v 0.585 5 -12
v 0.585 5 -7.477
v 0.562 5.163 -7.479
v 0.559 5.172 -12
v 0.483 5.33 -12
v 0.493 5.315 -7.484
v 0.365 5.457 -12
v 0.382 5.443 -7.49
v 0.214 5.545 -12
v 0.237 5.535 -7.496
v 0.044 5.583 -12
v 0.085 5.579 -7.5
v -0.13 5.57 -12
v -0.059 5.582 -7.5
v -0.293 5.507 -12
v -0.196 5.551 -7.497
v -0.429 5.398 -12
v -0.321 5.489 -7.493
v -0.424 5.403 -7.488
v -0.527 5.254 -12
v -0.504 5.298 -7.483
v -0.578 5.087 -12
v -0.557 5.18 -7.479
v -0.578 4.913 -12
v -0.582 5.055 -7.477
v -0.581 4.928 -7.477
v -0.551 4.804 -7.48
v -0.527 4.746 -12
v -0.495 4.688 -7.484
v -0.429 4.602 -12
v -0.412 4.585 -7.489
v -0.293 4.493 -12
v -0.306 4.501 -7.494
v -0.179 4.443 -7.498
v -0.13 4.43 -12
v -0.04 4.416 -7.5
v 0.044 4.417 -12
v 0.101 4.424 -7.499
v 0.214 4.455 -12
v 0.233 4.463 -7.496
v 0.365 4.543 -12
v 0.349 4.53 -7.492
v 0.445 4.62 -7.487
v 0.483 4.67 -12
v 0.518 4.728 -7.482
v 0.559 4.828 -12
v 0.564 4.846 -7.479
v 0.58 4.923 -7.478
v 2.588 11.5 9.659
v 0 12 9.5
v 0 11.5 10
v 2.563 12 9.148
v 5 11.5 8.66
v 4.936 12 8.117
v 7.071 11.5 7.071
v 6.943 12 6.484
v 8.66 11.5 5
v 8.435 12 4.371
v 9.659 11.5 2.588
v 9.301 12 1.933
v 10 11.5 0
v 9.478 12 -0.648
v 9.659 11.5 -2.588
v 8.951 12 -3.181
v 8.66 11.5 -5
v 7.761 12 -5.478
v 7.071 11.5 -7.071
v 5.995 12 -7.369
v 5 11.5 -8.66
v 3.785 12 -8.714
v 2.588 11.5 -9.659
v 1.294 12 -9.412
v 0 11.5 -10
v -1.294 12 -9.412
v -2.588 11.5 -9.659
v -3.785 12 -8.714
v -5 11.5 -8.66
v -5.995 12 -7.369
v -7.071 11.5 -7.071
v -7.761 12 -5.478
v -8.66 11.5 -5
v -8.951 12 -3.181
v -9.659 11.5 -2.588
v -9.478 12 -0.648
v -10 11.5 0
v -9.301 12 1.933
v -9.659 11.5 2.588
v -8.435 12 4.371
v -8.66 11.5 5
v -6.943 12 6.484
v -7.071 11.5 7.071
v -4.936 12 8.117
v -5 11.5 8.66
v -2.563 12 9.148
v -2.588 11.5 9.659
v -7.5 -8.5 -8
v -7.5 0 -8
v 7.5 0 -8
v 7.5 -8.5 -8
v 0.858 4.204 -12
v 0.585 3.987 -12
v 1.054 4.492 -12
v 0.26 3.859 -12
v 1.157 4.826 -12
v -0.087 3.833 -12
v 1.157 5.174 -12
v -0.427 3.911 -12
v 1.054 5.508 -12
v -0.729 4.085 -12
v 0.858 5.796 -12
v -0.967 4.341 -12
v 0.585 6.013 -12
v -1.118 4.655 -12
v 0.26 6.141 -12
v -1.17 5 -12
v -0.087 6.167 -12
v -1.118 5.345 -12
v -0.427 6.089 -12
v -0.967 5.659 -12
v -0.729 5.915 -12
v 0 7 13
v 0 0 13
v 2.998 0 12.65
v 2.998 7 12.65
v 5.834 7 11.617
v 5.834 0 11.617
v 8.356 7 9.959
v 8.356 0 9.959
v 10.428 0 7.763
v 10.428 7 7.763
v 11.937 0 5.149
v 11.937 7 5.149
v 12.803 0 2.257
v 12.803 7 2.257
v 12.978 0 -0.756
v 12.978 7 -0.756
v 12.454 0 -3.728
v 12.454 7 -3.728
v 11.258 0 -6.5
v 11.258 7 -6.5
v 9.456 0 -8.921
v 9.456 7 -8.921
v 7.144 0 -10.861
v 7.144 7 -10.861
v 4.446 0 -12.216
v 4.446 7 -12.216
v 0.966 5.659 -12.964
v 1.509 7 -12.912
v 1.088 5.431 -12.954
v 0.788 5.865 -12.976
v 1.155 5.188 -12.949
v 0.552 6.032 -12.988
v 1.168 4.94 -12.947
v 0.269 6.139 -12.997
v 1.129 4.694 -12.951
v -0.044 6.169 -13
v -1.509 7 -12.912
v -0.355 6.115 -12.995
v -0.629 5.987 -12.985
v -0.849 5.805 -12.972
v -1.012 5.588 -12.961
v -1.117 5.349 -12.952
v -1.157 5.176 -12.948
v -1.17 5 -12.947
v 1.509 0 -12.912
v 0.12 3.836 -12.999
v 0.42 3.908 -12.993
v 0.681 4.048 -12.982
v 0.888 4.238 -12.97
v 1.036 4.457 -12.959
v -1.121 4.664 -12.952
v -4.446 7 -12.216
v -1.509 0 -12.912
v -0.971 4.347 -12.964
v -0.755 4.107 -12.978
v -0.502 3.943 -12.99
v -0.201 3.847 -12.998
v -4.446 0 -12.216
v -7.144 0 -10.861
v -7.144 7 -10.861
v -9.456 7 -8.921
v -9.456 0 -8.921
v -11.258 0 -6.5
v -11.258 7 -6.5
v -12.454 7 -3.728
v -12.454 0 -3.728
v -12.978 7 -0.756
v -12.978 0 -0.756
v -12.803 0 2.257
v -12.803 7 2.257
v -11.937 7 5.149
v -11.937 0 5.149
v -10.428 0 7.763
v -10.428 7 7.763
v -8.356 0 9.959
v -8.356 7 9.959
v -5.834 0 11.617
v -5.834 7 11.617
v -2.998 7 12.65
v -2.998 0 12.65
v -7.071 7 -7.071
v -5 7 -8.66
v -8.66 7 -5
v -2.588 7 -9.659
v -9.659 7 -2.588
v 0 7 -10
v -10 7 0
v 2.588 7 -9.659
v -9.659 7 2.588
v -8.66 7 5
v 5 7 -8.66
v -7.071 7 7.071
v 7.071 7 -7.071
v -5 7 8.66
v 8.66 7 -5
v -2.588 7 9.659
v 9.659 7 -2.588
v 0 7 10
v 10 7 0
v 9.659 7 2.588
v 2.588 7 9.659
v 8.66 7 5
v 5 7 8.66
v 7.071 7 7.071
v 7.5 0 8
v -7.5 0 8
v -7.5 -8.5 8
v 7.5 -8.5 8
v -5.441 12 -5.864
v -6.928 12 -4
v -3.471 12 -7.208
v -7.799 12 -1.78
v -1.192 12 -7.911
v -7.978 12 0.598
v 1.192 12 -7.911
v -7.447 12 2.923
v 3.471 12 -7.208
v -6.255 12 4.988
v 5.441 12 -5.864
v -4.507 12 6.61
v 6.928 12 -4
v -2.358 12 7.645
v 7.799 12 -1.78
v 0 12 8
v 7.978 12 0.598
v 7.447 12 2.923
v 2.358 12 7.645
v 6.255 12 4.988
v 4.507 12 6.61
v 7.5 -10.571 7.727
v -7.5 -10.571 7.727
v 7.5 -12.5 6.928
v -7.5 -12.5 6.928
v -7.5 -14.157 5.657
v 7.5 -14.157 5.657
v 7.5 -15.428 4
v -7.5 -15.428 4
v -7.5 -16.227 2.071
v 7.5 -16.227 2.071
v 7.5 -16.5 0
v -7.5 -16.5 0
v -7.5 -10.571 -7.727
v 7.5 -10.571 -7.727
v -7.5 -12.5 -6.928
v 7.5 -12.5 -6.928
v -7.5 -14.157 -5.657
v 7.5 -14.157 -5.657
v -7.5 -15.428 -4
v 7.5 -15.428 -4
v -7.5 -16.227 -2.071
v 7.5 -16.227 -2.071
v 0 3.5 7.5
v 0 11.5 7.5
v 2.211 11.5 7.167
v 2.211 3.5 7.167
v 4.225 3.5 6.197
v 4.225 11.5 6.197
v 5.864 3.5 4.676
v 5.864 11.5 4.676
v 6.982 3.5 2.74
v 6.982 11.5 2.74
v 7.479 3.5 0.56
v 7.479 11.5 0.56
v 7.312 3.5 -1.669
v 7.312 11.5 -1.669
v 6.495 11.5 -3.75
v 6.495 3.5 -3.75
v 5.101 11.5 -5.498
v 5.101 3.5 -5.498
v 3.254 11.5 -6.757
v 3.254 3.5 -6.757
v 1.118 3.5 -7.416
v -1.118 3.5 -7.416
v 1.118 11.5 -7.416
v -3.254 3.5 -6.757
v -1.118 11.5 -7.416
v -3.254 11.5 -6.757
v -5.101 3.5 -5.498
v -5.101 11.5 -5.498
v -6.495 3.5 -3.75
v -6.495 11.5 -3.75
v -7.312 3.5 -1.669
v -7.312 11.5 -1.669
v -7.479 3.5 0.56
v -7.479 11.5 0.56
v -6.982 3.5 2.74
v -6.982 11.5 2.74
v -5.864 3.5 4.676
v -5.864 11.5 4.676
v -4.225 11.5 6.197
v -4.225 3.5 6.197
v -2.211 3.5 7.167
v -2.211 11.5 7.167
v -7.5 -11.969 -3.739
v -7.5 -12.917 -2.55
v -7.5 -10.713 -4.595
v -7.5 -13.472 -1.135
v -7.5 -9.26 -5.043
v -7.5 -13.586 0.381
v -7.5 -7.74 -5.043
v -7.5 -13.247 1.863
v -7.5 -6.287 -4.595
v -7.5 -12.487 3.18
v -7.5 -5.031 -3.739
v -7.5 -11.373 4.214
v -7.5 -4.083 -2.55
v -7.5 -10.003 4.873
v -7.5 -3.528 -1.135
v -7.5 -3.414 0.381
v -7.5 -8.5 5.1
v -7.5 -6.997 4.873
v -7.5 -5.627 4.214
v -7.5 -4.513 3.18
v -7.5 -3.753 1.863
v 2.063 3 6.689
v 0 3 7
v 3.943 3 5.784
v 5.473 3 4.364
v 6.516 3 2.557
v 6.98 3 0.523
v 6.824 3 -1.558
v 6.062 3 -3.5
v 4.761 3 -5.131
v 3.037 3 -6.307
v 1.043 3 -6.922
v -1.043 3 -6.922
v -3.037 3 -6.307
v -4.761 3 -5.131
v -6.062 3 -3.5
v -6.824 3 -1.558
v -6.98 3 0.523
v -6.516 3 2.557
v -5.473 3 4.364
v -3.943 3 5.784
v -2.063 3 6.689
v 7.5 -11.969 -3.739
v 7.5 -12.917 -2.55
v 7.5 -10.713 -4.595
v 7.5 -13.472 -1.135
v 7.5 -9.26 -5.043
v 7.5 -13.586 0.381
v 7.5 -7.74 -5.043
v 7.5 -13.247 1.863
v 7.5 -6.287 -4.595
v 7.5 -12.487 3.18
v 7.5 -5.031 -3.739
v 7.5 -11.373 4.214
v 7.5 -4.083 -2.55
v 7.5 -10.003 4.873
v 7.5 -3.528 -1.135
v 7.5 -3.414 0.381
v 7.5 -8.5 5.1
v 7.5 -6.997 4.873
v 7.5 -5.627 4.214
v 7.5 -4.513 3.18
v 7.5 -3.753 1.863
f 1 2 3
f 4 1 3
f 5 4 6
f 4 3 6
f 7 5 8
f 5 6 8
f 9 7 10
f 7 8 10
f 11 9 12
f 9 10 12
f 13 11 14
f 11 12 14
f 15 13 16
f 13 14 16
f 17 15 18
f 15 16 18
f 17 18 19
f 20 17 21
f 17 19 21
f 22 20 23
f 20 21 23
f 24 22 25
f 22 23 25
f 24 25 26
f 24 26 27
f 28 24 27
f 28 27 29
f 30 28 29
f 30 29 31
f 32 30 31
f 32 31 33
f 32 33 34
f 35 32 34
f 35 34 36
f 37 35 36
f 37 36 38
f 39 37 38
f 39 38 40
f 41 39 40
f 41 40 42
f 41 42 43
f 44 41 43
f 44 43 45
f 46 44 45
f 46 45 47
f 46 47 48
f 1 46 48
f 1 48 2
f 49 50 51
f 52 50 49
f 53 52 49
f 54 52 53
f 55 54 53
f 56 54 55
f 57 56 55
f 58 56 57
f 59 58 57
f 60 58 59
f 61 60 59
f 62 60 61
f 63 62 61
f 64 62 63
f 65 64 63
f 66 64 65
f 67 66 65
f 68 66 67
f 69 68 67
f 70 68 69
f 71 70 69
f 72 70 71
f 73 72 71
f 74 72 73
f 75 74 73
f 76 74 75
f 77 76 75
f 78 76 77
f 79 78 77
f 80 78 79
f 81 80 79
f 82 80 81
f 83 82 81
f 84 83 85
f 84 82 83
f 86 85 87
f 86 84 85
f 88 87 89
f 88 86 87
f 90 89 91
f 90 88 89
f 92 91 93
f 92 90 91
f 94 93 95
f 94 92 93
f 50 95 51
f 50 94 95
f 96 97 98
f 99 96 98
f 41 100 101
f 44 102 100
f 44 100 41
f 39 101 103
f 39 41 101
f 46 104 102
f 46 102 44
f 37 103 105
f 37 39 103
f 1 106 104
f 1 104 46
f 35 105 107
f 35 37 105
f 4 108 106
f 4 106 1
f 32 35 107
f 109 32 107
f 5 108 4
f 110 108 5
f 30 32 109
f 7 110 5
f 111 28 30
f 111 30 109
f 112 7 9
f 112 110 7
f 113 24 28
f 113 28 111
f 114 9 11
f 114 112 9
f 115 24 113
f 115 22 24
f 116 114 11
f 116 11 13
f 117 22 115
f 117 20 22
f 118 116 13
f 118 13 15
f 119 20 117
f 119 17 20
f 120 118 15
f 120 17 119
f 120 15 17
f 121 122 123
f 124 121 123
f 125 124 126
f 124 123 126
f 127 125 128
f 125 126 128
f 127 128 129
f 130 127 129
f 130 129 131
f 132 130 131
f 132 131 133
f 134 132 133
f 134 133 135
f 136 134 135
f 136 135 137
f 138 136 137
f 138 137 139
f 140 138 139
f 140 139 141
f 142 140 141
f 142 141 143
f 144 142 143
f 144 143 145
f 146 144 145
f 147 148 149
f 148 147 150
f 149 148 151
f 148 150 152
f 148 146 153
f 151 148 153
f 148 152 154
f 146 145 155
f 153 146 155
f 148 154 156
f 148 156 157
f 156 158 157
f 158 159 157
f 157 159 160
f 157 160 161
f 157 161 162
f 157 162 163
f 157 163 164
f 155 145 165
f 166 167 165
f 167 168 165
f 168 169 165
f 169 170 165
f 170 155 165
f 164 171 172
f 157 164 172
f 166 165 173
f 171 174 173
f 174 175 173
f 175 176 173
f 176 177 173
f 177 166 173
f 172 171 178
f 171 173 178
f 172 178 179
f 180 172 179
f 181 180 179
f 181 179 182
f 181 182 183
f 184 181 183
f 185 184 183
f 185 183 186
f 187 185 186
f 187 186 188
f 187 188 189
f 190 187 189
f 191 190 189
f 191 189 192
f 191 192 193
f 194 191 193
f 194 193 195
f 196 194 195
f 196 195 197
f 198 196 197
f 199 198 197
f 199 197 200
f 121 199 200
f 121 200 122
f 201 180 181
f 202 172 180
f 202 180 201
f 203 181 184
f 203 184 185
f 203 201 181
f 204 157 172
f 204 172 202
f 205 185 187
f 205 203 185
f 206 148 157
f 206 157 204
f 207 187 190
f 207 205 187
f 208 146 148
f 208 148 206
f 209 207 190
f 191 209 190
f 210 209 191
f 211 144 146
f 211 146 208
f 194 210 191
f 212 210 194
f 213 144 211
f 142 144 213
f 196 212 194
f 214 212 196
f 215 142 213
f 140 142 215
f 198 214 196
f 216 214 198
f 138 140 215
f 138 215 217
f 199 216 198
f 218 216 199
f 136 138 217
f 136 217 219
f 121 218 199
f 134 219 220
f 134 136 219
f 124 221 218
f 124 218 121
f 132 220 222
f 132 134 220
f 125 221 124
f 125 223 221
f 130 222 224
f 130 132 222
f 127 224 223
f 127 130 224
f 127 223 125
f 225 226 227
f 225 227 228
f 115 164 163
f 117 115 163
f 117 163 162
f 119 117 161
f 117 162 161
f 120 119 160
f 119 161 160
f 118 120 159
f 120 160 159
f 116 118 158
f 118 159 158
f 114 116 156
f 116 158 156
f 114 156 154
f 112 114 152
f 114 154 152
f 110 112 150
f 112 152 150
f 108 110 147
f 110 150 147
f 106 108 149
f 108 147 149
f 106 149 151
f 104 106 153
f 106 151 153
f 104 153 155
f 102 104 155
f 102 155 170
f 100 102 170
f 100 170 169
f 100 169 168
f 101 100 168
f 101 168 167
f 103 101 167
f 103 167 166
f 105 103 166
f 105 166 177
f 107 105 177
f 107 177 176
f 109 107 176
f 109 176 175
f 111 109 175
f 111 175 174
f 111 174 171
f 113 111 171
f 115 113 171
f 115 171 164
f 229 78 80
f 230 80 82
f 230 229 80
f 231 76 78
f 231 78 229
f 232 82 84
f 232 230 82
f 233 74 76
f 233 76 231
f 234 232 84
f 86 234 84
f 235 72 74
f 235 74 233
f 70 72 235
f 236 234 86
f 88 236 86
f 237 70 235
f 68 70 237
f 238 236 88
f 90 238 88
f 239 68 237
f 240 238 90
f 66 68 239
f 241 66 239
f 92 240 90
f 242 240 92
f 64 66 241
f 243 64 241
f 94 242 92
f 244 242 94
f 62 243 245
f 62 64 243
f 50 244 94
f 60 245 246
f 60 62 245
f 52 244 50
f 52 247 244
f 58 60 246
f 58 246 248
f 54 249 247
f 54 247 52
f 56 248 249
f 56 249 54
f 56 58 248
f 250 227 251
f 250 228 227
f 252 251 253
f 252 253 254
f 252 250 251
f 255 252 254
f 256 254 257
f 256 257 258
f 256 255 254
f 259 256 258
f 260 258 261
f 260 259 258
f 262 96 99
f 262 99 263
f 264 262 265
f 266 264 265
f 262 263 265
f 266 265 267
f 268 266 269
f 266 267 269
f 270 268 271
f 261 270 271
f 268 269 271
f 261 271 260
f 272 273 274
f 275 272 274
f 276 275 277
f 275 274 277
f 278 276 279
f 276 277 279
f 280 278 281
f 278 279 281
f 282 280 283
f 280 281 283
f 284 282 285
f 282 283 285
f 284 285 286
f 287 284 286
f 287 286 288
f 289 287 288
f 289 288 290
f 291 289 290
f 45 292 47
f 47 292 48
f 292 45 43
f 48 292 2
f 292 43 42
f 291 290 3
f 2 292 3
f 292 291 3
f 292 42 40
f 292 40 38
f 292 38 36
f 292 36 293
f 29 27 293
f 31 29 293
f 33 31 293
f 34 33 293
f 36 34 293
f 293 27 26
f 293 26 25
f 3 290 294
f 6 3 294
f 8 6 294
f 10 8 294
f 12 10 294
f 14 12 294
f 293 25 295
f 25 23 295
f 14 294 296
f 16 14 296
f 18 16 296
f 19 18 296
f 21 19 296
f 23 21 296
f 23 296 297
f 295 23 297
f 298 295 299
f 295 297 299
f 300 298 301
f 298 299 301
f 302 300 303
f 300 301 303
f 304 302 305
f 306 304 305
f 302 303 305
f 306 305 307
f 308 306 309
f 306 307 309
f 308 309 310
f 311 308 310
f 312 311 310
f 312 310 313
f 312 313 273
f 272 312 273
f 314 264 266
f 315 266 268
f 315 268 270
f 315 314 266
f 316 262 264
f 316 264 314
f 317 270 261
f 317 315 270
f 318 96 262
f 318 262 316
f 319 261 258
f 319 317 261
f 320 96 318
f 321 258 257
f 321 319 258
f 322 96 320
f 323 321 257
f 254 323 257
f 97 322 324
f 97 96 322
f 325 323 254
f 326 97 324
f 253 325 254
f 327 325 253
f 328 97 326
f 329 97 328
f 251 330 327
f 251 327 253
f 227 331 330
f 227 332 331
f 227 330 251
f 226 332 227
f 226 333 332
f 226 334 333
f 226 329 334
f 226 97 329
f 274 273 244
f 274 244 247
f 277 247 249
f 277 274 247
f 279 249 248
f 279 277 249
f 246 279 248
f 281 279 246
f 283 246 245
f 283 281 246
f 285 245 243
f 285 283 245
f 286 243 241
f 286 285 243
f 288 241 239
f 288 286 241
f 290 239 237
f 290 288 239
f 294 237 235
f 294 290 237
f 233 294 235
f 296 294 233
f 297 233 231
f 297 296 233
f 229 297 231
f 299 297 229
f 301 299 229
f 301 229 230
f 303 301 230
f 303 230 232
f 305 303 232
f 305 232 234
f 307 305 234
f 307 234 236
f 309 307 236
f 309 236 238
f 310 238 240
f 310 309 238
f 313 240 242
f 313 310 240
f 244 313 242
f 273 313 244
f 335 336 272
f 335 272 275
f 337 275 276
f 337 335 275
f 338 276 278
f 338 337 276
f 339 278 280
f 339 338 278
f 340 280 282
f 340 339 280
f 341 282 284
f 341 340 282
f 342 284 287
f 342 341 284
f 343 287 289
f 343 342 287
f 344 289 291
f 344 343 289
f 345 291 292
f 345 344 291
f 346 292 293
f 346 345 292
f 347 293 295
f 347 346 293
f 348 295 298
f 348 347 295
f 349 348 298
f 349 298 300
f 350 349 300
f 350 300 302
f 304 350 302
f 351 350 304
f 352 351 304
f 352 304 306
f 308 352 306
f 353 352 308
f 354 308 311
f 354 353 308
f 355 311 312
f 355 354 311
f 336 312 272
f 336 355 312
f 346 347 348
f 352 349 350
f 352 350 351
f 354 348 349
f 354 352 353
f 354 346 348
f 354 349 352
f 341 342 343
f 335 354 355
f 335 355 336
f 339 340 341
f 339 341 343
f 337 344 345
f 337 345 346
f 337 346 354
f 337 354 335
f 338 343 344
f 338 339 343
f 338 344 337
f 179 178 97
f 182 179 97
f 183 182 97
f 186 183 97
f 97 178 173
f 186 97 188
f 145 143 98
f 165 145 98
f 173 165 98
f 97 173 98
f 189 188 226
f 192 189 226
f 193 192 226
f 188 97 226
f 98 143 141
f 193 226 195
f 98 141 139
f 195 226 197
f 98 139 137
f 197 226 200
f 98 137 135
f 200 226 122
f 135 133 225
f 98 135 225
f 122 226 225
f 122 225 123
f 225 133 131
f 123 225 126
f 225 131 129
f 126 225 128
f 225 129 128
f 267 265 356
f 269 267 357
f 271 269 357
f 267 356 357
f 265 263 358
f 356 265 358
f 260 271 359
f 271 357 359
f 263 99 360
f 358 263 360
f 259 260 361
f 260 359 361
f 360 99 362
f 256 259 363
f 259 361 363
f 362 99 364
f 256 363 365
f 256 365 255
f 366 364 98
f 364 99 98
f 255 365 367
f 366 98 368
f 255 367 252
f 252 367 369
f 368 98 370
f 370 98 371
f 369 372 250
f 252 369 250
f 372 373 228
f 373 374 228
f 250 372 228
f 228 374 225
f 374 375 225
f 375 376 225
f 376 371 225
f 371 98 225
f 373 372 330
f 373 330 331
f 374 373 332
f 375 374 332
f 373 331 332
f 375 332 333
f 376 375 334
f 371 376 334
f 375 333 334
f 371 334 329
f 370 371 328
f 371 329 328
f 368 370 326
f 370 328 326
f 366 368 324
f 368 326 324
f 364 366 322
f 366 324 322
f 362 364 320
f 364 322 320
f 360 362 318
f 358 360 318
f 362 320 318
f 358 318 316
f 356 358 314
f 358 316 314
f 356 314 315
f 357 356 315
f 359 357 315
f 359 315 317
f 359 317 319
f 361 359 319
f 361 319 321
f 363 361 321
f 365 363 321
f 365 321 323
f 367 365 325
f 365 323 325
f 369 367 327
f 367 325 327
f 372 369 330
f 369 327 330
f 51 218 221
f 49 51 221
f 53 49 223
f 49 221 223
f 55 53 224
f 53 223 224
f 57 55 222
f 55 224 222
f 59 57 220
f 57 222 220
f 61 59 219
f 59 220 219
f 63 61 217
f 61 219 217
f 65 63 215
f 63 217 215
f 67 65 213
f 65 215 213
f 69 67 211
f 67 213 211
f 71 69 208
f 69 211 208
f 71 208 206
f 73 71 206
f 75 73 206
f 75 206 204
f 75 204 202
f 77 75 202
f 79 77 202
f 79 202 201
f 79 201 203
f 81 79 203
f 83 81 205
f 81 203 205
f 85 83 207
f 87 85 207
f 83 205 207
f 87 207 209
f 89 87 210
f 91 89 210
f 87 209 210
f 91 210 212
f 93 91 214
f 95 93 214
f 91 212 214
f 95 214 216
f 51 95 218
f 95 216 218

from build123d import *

# Parameters (mm, degrees)
SKETCH1_R           = 13
BOSS_EXTRUDE1_DEPTH = 7
SKETCH2_R           = 10
BOSS_EXTRUDE2_DEPTH = 5
SKETCH3_R           = 7.5
CUT_EXTRUDE1_DEPTH  = 9
CHAMFER1_SIZE       = 0.5
SKETCH4_R           = 0.585
CUT_EXTRUDE2_DEPTH  = 22.9544984
SKETCH5_W           = 15
SKETCH5_H           = 16
BOSS_EXTRUDE3_DEPTH = 16.5
FILLET1_R           = 8
SKETCH8_R           = 5.1
CUT_EXTRUDE4_DEPTH  = 15
SKETCH9_R           = 1.17
CUT_EXTRUDE5_DEPTH  = 1


with BuildPart() as part:
    # Sketch1 → Boss-Extrude1 (new body)
    with BuildSketch(Plane(origin=(0, 0, 0), x_dir=(1, 0, 0), z_dir=(0, 1, 0))):
        with Locations(Location((0, 0, 0), (0, 0, 270))):
            Circle(SKETCH1_R)
    extrude(amount=BOSS_EXTRUDE1_DEPTH)

    # Sketch2 → Boss-Extrude2 (add)
    with BuildSketch(Plane(origin=(0, 7, 0), x_dir=(1, 0, 0), z_dir=(0, 1, 0))):
        with Locations(Location((0, 0, 0), (0, 0, 270))):
            Circle(SKETCH2_R)
    extrude(amount=BOSS_EXTRUDE2_DEPTH)

    # Sketch3 → Cut-Extrude1 (cut)
    with BuildSketch(Plane(origin=(0, 12, 0), x_dir=(1, 0, 0), z_dir=(0, 1, 0))):
        with Locations(Location((0, 0, 0), (0, 0, 270))):
            Circle(SKETCH3_R)
    extrude(amount=-CUT_EXTRUDE1_DEPTH, mode=Mode.SUBTRACT)

    # Chamfer1
    chamfer1_edges = [part.edges().sort_by_distance(p)[0] for p in [
        (0, 3, -7.5),
        (0, 12, -7.5),
        (0, 12, -10),
    ]]
    chamfer(chamfer1_edges, length=CHAMFER1_SIZE)

    # Sketch4 → Cut-Extrude2 (cut, through all)
    with BuildSketch(Plane.XY):
        with Locations((0, 5)):
            Circle(SKETCH4_R)
    extrude(amount=-CUT_EXTRUDE2_DEPTH, mode=Mode.SUBTRACT)

    # Sketch5 → Boss-Extrude3 (add)
    with BuildSketch(Plane.XZ):
        Rectangle(SKETCH5_W, SKETCH5_H)
    extrude(amount=BOSS_EXTRUDE3_DEPTH)

    # Fillet1
    fillet1_edges = [part.edges().sort_by_distance(p)[0] for p in [
        (0, -16.5, 8),
        (0, -16.5, -8),
    ]]
    fillet(fillet1_edges, radius=FILLET1_R - 0.0001)  # a hair under: the kernel refuses the full size

    # Sketch8 → Cut-Extrude4 (cut)
    with BuildSketch(Plane.ZY.offset(7.5)):
        with Locations((0, -8.5)):
            Circle(SKETCH8_R)
    extrude(amount=-CUT_EXTRUDE4_DEPTH, mode=Mode.SUBTRACT)

    # Sketch9 → Cut-Extrude5 (cut)
    with BuildSketch(Plane(origin=(0, 0, -13), x_dir=(-1, 0, 0), z_dir=(0, 0, -1))):
        with Locations((0, 5)):
            Circle(SKETCH9_R)
    extrude(amount=-CUT_EXTRUDE5_DEPTH, mode=Mode.SUBTRACT)


solid = part.part
